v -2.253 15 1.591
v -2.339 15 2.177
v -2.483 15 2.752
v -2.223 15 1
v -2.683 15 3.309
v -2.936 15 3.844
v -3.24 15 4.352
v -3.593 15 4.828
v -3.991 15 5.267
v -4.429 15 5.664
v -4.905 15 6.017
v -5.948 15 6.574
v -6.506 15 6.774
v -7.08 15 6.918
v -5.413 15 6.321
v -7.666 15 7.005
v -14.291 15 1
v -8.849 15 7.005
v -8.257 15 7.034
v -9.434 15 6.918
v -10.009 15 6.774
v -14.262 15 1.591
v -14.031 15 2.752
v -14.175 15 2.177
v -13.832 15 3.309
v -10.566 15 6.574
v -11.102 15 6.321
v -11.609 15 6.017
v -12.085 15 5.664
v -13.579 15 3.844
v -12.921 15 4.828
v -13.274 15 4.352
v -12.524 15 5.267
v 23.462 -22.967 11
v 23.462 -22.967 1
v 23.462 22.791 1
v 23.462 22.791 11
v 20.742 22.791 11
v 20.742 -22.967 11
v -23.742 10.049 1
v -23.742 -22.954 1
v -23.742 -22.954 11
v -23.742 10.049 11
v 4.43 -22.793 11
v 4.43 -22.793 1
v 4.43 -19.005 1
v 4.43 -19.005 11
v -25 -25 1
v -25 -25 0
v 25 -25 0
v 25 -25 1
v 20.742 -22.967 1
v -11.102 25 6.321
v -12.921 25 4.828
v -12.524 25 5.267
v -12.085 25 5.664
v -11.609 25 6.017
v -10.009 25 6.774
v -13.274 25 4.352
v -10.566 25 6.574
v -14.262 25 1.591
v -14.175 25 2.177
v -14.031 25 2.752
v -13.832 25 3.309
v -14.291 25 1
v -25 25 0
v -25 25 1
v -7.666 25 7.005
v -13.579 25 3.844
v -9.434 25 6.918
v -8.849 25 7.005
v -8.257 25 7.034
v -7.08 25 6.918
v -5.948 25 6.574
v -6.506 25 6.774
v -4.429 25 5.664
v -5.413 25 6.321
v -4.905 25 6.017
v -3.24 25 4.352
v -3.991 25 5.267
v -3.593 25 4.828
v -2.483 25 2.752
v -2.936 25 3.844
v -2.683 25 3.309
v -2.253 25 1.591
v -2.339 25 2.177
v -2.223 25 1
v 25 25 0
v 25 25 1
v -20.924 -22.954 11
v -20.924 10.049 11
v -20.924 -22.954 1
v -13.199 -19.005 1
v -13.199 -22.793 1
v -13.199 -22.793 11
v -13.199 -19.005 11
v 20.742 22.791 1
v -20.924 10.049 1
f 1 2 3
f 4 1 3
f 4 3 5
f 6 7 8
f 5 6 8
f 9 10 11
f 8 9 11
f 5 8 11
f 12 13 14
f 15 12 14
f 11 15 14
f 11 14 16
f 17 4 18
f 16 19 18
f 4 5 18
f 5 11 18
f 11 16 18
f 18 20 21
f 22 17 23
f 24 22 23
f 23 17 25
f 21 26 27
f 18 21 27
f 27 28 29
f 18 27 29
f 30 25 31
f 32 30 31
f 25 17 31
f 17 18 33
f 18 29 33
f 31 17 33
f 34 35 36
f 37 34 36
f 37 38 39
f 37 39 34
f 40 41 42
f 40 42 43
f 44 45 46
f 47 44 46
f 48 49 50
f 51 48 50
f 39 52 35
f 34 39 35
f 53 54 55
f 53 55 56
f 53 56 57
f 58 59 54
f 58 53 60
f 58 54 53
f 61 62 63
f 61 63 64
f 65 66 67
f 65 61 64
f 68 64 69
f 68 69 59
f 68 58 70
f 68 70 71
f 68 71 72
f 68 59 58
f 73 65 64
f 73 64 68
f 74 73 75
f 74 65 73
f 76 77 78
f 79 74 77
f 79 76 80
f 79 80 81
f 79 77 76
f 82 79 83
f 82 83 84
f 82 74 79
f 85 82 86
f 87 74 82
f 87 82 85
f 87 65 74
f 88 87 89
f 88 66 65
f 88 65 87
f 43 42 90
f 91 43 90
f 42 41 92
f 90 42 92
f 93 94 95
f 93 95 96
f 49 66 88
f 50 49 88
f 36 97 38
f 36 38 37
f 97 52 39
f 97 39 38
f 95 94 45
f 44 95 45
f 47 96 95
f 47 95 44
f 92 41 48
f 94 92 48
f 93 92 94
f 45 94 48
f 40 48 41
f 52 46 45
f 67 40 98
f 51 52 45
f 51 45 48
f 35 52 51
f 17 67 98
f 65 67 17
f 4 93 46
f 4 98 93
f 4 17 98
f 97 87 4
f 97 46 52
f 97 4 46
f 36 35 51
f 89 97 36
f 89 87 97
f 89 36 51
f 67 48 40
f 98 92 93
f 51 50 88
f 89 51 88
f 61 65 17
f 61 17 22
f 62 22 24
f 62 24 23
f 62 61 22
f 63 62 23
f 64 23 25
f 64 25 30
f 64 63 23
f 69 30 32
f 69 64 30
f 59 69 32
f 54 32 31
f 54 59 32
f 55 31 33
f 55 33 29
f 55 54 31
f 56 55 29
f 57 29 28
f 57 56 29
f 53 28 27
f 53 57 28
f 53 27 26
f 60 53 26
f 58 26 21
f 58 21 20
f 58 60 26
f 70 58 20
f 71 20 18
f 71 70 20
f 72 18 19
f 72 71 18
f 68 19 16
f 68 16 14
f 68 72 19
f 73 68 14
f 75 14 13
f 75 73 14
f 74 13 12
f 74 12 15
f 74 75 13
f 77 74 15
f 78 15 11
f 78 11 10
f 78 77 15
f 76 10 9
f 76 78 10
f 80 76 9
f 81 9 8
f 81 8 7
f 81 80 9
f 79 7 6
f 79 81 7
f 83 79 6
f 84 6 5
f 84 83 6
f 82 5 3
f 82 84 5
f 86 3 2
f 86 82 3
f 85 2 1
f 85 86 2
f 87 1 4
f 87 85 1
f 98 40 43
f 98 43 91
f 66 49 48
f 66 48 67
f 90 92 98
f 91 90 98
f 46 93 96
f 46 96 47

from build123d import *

# Parameters (mm, degrees)
F0_W     = 50
F0_H     = 50
F1_DEPTH = 1
F2_W     = 2.719909
F2_H     = 45.7574
F3_DEPTH = 10
F4_W     = 2.818288
F4_H     = 33.003134
F5_DEPTH = 10
F6_W     = 17.629229
F6_H     = 3.787741
F7_DEPTH = 10
F9_DEPTH = 10


with BuildPart() as f1:
    # F0 (on Top) → F1 (new body)
    with BuildSketch(Plane.XY):
        Rectangle(F0_W, F0_H)
    extrude(amount=F1_DEPTH)

    # F2 (on face) → F3 (join)
    with BuildSketch(Plane.XY.offset(1)):
        with Locations((22.101672, -0.088033)):
            Rectangle(F2_W, F2_H)
    extrude(amount=F3_DEPTH)

    # F4 (on face) → F5 (join)
    with BuildSketch(Plane.XY.offset(1)):
        with Locations((-22.33317, -6.452603)):
            Rectangle(F4_W, F4_H)
    extrude(amount=F5_DEPTH)

    # F6 (on face) → F7 (join)
    with BuildSketch(Plane.XY.offset(1)):
        with Locations((-4.384833, -20.898708)):
            Rectangle(F6_W, F6_H)
    extrude(amount=F7_DEPTH)

    # F8 (on face) → F9 (join)
    with BuildSketch(Plane(origin=(0, 25, 0), x_dir=(-1, 0, 0), z_dir=(0, 1, 0))):
        with BuildLine():
            Line((2.223496, 1), (14.291007, 1))
            ThreePointArc((14.291007, 1), (8.257251, 7.033755), (2.223496, 1))
        make_face()
    extrude(amount=-F9_DEPTH)


solid = f1.part
